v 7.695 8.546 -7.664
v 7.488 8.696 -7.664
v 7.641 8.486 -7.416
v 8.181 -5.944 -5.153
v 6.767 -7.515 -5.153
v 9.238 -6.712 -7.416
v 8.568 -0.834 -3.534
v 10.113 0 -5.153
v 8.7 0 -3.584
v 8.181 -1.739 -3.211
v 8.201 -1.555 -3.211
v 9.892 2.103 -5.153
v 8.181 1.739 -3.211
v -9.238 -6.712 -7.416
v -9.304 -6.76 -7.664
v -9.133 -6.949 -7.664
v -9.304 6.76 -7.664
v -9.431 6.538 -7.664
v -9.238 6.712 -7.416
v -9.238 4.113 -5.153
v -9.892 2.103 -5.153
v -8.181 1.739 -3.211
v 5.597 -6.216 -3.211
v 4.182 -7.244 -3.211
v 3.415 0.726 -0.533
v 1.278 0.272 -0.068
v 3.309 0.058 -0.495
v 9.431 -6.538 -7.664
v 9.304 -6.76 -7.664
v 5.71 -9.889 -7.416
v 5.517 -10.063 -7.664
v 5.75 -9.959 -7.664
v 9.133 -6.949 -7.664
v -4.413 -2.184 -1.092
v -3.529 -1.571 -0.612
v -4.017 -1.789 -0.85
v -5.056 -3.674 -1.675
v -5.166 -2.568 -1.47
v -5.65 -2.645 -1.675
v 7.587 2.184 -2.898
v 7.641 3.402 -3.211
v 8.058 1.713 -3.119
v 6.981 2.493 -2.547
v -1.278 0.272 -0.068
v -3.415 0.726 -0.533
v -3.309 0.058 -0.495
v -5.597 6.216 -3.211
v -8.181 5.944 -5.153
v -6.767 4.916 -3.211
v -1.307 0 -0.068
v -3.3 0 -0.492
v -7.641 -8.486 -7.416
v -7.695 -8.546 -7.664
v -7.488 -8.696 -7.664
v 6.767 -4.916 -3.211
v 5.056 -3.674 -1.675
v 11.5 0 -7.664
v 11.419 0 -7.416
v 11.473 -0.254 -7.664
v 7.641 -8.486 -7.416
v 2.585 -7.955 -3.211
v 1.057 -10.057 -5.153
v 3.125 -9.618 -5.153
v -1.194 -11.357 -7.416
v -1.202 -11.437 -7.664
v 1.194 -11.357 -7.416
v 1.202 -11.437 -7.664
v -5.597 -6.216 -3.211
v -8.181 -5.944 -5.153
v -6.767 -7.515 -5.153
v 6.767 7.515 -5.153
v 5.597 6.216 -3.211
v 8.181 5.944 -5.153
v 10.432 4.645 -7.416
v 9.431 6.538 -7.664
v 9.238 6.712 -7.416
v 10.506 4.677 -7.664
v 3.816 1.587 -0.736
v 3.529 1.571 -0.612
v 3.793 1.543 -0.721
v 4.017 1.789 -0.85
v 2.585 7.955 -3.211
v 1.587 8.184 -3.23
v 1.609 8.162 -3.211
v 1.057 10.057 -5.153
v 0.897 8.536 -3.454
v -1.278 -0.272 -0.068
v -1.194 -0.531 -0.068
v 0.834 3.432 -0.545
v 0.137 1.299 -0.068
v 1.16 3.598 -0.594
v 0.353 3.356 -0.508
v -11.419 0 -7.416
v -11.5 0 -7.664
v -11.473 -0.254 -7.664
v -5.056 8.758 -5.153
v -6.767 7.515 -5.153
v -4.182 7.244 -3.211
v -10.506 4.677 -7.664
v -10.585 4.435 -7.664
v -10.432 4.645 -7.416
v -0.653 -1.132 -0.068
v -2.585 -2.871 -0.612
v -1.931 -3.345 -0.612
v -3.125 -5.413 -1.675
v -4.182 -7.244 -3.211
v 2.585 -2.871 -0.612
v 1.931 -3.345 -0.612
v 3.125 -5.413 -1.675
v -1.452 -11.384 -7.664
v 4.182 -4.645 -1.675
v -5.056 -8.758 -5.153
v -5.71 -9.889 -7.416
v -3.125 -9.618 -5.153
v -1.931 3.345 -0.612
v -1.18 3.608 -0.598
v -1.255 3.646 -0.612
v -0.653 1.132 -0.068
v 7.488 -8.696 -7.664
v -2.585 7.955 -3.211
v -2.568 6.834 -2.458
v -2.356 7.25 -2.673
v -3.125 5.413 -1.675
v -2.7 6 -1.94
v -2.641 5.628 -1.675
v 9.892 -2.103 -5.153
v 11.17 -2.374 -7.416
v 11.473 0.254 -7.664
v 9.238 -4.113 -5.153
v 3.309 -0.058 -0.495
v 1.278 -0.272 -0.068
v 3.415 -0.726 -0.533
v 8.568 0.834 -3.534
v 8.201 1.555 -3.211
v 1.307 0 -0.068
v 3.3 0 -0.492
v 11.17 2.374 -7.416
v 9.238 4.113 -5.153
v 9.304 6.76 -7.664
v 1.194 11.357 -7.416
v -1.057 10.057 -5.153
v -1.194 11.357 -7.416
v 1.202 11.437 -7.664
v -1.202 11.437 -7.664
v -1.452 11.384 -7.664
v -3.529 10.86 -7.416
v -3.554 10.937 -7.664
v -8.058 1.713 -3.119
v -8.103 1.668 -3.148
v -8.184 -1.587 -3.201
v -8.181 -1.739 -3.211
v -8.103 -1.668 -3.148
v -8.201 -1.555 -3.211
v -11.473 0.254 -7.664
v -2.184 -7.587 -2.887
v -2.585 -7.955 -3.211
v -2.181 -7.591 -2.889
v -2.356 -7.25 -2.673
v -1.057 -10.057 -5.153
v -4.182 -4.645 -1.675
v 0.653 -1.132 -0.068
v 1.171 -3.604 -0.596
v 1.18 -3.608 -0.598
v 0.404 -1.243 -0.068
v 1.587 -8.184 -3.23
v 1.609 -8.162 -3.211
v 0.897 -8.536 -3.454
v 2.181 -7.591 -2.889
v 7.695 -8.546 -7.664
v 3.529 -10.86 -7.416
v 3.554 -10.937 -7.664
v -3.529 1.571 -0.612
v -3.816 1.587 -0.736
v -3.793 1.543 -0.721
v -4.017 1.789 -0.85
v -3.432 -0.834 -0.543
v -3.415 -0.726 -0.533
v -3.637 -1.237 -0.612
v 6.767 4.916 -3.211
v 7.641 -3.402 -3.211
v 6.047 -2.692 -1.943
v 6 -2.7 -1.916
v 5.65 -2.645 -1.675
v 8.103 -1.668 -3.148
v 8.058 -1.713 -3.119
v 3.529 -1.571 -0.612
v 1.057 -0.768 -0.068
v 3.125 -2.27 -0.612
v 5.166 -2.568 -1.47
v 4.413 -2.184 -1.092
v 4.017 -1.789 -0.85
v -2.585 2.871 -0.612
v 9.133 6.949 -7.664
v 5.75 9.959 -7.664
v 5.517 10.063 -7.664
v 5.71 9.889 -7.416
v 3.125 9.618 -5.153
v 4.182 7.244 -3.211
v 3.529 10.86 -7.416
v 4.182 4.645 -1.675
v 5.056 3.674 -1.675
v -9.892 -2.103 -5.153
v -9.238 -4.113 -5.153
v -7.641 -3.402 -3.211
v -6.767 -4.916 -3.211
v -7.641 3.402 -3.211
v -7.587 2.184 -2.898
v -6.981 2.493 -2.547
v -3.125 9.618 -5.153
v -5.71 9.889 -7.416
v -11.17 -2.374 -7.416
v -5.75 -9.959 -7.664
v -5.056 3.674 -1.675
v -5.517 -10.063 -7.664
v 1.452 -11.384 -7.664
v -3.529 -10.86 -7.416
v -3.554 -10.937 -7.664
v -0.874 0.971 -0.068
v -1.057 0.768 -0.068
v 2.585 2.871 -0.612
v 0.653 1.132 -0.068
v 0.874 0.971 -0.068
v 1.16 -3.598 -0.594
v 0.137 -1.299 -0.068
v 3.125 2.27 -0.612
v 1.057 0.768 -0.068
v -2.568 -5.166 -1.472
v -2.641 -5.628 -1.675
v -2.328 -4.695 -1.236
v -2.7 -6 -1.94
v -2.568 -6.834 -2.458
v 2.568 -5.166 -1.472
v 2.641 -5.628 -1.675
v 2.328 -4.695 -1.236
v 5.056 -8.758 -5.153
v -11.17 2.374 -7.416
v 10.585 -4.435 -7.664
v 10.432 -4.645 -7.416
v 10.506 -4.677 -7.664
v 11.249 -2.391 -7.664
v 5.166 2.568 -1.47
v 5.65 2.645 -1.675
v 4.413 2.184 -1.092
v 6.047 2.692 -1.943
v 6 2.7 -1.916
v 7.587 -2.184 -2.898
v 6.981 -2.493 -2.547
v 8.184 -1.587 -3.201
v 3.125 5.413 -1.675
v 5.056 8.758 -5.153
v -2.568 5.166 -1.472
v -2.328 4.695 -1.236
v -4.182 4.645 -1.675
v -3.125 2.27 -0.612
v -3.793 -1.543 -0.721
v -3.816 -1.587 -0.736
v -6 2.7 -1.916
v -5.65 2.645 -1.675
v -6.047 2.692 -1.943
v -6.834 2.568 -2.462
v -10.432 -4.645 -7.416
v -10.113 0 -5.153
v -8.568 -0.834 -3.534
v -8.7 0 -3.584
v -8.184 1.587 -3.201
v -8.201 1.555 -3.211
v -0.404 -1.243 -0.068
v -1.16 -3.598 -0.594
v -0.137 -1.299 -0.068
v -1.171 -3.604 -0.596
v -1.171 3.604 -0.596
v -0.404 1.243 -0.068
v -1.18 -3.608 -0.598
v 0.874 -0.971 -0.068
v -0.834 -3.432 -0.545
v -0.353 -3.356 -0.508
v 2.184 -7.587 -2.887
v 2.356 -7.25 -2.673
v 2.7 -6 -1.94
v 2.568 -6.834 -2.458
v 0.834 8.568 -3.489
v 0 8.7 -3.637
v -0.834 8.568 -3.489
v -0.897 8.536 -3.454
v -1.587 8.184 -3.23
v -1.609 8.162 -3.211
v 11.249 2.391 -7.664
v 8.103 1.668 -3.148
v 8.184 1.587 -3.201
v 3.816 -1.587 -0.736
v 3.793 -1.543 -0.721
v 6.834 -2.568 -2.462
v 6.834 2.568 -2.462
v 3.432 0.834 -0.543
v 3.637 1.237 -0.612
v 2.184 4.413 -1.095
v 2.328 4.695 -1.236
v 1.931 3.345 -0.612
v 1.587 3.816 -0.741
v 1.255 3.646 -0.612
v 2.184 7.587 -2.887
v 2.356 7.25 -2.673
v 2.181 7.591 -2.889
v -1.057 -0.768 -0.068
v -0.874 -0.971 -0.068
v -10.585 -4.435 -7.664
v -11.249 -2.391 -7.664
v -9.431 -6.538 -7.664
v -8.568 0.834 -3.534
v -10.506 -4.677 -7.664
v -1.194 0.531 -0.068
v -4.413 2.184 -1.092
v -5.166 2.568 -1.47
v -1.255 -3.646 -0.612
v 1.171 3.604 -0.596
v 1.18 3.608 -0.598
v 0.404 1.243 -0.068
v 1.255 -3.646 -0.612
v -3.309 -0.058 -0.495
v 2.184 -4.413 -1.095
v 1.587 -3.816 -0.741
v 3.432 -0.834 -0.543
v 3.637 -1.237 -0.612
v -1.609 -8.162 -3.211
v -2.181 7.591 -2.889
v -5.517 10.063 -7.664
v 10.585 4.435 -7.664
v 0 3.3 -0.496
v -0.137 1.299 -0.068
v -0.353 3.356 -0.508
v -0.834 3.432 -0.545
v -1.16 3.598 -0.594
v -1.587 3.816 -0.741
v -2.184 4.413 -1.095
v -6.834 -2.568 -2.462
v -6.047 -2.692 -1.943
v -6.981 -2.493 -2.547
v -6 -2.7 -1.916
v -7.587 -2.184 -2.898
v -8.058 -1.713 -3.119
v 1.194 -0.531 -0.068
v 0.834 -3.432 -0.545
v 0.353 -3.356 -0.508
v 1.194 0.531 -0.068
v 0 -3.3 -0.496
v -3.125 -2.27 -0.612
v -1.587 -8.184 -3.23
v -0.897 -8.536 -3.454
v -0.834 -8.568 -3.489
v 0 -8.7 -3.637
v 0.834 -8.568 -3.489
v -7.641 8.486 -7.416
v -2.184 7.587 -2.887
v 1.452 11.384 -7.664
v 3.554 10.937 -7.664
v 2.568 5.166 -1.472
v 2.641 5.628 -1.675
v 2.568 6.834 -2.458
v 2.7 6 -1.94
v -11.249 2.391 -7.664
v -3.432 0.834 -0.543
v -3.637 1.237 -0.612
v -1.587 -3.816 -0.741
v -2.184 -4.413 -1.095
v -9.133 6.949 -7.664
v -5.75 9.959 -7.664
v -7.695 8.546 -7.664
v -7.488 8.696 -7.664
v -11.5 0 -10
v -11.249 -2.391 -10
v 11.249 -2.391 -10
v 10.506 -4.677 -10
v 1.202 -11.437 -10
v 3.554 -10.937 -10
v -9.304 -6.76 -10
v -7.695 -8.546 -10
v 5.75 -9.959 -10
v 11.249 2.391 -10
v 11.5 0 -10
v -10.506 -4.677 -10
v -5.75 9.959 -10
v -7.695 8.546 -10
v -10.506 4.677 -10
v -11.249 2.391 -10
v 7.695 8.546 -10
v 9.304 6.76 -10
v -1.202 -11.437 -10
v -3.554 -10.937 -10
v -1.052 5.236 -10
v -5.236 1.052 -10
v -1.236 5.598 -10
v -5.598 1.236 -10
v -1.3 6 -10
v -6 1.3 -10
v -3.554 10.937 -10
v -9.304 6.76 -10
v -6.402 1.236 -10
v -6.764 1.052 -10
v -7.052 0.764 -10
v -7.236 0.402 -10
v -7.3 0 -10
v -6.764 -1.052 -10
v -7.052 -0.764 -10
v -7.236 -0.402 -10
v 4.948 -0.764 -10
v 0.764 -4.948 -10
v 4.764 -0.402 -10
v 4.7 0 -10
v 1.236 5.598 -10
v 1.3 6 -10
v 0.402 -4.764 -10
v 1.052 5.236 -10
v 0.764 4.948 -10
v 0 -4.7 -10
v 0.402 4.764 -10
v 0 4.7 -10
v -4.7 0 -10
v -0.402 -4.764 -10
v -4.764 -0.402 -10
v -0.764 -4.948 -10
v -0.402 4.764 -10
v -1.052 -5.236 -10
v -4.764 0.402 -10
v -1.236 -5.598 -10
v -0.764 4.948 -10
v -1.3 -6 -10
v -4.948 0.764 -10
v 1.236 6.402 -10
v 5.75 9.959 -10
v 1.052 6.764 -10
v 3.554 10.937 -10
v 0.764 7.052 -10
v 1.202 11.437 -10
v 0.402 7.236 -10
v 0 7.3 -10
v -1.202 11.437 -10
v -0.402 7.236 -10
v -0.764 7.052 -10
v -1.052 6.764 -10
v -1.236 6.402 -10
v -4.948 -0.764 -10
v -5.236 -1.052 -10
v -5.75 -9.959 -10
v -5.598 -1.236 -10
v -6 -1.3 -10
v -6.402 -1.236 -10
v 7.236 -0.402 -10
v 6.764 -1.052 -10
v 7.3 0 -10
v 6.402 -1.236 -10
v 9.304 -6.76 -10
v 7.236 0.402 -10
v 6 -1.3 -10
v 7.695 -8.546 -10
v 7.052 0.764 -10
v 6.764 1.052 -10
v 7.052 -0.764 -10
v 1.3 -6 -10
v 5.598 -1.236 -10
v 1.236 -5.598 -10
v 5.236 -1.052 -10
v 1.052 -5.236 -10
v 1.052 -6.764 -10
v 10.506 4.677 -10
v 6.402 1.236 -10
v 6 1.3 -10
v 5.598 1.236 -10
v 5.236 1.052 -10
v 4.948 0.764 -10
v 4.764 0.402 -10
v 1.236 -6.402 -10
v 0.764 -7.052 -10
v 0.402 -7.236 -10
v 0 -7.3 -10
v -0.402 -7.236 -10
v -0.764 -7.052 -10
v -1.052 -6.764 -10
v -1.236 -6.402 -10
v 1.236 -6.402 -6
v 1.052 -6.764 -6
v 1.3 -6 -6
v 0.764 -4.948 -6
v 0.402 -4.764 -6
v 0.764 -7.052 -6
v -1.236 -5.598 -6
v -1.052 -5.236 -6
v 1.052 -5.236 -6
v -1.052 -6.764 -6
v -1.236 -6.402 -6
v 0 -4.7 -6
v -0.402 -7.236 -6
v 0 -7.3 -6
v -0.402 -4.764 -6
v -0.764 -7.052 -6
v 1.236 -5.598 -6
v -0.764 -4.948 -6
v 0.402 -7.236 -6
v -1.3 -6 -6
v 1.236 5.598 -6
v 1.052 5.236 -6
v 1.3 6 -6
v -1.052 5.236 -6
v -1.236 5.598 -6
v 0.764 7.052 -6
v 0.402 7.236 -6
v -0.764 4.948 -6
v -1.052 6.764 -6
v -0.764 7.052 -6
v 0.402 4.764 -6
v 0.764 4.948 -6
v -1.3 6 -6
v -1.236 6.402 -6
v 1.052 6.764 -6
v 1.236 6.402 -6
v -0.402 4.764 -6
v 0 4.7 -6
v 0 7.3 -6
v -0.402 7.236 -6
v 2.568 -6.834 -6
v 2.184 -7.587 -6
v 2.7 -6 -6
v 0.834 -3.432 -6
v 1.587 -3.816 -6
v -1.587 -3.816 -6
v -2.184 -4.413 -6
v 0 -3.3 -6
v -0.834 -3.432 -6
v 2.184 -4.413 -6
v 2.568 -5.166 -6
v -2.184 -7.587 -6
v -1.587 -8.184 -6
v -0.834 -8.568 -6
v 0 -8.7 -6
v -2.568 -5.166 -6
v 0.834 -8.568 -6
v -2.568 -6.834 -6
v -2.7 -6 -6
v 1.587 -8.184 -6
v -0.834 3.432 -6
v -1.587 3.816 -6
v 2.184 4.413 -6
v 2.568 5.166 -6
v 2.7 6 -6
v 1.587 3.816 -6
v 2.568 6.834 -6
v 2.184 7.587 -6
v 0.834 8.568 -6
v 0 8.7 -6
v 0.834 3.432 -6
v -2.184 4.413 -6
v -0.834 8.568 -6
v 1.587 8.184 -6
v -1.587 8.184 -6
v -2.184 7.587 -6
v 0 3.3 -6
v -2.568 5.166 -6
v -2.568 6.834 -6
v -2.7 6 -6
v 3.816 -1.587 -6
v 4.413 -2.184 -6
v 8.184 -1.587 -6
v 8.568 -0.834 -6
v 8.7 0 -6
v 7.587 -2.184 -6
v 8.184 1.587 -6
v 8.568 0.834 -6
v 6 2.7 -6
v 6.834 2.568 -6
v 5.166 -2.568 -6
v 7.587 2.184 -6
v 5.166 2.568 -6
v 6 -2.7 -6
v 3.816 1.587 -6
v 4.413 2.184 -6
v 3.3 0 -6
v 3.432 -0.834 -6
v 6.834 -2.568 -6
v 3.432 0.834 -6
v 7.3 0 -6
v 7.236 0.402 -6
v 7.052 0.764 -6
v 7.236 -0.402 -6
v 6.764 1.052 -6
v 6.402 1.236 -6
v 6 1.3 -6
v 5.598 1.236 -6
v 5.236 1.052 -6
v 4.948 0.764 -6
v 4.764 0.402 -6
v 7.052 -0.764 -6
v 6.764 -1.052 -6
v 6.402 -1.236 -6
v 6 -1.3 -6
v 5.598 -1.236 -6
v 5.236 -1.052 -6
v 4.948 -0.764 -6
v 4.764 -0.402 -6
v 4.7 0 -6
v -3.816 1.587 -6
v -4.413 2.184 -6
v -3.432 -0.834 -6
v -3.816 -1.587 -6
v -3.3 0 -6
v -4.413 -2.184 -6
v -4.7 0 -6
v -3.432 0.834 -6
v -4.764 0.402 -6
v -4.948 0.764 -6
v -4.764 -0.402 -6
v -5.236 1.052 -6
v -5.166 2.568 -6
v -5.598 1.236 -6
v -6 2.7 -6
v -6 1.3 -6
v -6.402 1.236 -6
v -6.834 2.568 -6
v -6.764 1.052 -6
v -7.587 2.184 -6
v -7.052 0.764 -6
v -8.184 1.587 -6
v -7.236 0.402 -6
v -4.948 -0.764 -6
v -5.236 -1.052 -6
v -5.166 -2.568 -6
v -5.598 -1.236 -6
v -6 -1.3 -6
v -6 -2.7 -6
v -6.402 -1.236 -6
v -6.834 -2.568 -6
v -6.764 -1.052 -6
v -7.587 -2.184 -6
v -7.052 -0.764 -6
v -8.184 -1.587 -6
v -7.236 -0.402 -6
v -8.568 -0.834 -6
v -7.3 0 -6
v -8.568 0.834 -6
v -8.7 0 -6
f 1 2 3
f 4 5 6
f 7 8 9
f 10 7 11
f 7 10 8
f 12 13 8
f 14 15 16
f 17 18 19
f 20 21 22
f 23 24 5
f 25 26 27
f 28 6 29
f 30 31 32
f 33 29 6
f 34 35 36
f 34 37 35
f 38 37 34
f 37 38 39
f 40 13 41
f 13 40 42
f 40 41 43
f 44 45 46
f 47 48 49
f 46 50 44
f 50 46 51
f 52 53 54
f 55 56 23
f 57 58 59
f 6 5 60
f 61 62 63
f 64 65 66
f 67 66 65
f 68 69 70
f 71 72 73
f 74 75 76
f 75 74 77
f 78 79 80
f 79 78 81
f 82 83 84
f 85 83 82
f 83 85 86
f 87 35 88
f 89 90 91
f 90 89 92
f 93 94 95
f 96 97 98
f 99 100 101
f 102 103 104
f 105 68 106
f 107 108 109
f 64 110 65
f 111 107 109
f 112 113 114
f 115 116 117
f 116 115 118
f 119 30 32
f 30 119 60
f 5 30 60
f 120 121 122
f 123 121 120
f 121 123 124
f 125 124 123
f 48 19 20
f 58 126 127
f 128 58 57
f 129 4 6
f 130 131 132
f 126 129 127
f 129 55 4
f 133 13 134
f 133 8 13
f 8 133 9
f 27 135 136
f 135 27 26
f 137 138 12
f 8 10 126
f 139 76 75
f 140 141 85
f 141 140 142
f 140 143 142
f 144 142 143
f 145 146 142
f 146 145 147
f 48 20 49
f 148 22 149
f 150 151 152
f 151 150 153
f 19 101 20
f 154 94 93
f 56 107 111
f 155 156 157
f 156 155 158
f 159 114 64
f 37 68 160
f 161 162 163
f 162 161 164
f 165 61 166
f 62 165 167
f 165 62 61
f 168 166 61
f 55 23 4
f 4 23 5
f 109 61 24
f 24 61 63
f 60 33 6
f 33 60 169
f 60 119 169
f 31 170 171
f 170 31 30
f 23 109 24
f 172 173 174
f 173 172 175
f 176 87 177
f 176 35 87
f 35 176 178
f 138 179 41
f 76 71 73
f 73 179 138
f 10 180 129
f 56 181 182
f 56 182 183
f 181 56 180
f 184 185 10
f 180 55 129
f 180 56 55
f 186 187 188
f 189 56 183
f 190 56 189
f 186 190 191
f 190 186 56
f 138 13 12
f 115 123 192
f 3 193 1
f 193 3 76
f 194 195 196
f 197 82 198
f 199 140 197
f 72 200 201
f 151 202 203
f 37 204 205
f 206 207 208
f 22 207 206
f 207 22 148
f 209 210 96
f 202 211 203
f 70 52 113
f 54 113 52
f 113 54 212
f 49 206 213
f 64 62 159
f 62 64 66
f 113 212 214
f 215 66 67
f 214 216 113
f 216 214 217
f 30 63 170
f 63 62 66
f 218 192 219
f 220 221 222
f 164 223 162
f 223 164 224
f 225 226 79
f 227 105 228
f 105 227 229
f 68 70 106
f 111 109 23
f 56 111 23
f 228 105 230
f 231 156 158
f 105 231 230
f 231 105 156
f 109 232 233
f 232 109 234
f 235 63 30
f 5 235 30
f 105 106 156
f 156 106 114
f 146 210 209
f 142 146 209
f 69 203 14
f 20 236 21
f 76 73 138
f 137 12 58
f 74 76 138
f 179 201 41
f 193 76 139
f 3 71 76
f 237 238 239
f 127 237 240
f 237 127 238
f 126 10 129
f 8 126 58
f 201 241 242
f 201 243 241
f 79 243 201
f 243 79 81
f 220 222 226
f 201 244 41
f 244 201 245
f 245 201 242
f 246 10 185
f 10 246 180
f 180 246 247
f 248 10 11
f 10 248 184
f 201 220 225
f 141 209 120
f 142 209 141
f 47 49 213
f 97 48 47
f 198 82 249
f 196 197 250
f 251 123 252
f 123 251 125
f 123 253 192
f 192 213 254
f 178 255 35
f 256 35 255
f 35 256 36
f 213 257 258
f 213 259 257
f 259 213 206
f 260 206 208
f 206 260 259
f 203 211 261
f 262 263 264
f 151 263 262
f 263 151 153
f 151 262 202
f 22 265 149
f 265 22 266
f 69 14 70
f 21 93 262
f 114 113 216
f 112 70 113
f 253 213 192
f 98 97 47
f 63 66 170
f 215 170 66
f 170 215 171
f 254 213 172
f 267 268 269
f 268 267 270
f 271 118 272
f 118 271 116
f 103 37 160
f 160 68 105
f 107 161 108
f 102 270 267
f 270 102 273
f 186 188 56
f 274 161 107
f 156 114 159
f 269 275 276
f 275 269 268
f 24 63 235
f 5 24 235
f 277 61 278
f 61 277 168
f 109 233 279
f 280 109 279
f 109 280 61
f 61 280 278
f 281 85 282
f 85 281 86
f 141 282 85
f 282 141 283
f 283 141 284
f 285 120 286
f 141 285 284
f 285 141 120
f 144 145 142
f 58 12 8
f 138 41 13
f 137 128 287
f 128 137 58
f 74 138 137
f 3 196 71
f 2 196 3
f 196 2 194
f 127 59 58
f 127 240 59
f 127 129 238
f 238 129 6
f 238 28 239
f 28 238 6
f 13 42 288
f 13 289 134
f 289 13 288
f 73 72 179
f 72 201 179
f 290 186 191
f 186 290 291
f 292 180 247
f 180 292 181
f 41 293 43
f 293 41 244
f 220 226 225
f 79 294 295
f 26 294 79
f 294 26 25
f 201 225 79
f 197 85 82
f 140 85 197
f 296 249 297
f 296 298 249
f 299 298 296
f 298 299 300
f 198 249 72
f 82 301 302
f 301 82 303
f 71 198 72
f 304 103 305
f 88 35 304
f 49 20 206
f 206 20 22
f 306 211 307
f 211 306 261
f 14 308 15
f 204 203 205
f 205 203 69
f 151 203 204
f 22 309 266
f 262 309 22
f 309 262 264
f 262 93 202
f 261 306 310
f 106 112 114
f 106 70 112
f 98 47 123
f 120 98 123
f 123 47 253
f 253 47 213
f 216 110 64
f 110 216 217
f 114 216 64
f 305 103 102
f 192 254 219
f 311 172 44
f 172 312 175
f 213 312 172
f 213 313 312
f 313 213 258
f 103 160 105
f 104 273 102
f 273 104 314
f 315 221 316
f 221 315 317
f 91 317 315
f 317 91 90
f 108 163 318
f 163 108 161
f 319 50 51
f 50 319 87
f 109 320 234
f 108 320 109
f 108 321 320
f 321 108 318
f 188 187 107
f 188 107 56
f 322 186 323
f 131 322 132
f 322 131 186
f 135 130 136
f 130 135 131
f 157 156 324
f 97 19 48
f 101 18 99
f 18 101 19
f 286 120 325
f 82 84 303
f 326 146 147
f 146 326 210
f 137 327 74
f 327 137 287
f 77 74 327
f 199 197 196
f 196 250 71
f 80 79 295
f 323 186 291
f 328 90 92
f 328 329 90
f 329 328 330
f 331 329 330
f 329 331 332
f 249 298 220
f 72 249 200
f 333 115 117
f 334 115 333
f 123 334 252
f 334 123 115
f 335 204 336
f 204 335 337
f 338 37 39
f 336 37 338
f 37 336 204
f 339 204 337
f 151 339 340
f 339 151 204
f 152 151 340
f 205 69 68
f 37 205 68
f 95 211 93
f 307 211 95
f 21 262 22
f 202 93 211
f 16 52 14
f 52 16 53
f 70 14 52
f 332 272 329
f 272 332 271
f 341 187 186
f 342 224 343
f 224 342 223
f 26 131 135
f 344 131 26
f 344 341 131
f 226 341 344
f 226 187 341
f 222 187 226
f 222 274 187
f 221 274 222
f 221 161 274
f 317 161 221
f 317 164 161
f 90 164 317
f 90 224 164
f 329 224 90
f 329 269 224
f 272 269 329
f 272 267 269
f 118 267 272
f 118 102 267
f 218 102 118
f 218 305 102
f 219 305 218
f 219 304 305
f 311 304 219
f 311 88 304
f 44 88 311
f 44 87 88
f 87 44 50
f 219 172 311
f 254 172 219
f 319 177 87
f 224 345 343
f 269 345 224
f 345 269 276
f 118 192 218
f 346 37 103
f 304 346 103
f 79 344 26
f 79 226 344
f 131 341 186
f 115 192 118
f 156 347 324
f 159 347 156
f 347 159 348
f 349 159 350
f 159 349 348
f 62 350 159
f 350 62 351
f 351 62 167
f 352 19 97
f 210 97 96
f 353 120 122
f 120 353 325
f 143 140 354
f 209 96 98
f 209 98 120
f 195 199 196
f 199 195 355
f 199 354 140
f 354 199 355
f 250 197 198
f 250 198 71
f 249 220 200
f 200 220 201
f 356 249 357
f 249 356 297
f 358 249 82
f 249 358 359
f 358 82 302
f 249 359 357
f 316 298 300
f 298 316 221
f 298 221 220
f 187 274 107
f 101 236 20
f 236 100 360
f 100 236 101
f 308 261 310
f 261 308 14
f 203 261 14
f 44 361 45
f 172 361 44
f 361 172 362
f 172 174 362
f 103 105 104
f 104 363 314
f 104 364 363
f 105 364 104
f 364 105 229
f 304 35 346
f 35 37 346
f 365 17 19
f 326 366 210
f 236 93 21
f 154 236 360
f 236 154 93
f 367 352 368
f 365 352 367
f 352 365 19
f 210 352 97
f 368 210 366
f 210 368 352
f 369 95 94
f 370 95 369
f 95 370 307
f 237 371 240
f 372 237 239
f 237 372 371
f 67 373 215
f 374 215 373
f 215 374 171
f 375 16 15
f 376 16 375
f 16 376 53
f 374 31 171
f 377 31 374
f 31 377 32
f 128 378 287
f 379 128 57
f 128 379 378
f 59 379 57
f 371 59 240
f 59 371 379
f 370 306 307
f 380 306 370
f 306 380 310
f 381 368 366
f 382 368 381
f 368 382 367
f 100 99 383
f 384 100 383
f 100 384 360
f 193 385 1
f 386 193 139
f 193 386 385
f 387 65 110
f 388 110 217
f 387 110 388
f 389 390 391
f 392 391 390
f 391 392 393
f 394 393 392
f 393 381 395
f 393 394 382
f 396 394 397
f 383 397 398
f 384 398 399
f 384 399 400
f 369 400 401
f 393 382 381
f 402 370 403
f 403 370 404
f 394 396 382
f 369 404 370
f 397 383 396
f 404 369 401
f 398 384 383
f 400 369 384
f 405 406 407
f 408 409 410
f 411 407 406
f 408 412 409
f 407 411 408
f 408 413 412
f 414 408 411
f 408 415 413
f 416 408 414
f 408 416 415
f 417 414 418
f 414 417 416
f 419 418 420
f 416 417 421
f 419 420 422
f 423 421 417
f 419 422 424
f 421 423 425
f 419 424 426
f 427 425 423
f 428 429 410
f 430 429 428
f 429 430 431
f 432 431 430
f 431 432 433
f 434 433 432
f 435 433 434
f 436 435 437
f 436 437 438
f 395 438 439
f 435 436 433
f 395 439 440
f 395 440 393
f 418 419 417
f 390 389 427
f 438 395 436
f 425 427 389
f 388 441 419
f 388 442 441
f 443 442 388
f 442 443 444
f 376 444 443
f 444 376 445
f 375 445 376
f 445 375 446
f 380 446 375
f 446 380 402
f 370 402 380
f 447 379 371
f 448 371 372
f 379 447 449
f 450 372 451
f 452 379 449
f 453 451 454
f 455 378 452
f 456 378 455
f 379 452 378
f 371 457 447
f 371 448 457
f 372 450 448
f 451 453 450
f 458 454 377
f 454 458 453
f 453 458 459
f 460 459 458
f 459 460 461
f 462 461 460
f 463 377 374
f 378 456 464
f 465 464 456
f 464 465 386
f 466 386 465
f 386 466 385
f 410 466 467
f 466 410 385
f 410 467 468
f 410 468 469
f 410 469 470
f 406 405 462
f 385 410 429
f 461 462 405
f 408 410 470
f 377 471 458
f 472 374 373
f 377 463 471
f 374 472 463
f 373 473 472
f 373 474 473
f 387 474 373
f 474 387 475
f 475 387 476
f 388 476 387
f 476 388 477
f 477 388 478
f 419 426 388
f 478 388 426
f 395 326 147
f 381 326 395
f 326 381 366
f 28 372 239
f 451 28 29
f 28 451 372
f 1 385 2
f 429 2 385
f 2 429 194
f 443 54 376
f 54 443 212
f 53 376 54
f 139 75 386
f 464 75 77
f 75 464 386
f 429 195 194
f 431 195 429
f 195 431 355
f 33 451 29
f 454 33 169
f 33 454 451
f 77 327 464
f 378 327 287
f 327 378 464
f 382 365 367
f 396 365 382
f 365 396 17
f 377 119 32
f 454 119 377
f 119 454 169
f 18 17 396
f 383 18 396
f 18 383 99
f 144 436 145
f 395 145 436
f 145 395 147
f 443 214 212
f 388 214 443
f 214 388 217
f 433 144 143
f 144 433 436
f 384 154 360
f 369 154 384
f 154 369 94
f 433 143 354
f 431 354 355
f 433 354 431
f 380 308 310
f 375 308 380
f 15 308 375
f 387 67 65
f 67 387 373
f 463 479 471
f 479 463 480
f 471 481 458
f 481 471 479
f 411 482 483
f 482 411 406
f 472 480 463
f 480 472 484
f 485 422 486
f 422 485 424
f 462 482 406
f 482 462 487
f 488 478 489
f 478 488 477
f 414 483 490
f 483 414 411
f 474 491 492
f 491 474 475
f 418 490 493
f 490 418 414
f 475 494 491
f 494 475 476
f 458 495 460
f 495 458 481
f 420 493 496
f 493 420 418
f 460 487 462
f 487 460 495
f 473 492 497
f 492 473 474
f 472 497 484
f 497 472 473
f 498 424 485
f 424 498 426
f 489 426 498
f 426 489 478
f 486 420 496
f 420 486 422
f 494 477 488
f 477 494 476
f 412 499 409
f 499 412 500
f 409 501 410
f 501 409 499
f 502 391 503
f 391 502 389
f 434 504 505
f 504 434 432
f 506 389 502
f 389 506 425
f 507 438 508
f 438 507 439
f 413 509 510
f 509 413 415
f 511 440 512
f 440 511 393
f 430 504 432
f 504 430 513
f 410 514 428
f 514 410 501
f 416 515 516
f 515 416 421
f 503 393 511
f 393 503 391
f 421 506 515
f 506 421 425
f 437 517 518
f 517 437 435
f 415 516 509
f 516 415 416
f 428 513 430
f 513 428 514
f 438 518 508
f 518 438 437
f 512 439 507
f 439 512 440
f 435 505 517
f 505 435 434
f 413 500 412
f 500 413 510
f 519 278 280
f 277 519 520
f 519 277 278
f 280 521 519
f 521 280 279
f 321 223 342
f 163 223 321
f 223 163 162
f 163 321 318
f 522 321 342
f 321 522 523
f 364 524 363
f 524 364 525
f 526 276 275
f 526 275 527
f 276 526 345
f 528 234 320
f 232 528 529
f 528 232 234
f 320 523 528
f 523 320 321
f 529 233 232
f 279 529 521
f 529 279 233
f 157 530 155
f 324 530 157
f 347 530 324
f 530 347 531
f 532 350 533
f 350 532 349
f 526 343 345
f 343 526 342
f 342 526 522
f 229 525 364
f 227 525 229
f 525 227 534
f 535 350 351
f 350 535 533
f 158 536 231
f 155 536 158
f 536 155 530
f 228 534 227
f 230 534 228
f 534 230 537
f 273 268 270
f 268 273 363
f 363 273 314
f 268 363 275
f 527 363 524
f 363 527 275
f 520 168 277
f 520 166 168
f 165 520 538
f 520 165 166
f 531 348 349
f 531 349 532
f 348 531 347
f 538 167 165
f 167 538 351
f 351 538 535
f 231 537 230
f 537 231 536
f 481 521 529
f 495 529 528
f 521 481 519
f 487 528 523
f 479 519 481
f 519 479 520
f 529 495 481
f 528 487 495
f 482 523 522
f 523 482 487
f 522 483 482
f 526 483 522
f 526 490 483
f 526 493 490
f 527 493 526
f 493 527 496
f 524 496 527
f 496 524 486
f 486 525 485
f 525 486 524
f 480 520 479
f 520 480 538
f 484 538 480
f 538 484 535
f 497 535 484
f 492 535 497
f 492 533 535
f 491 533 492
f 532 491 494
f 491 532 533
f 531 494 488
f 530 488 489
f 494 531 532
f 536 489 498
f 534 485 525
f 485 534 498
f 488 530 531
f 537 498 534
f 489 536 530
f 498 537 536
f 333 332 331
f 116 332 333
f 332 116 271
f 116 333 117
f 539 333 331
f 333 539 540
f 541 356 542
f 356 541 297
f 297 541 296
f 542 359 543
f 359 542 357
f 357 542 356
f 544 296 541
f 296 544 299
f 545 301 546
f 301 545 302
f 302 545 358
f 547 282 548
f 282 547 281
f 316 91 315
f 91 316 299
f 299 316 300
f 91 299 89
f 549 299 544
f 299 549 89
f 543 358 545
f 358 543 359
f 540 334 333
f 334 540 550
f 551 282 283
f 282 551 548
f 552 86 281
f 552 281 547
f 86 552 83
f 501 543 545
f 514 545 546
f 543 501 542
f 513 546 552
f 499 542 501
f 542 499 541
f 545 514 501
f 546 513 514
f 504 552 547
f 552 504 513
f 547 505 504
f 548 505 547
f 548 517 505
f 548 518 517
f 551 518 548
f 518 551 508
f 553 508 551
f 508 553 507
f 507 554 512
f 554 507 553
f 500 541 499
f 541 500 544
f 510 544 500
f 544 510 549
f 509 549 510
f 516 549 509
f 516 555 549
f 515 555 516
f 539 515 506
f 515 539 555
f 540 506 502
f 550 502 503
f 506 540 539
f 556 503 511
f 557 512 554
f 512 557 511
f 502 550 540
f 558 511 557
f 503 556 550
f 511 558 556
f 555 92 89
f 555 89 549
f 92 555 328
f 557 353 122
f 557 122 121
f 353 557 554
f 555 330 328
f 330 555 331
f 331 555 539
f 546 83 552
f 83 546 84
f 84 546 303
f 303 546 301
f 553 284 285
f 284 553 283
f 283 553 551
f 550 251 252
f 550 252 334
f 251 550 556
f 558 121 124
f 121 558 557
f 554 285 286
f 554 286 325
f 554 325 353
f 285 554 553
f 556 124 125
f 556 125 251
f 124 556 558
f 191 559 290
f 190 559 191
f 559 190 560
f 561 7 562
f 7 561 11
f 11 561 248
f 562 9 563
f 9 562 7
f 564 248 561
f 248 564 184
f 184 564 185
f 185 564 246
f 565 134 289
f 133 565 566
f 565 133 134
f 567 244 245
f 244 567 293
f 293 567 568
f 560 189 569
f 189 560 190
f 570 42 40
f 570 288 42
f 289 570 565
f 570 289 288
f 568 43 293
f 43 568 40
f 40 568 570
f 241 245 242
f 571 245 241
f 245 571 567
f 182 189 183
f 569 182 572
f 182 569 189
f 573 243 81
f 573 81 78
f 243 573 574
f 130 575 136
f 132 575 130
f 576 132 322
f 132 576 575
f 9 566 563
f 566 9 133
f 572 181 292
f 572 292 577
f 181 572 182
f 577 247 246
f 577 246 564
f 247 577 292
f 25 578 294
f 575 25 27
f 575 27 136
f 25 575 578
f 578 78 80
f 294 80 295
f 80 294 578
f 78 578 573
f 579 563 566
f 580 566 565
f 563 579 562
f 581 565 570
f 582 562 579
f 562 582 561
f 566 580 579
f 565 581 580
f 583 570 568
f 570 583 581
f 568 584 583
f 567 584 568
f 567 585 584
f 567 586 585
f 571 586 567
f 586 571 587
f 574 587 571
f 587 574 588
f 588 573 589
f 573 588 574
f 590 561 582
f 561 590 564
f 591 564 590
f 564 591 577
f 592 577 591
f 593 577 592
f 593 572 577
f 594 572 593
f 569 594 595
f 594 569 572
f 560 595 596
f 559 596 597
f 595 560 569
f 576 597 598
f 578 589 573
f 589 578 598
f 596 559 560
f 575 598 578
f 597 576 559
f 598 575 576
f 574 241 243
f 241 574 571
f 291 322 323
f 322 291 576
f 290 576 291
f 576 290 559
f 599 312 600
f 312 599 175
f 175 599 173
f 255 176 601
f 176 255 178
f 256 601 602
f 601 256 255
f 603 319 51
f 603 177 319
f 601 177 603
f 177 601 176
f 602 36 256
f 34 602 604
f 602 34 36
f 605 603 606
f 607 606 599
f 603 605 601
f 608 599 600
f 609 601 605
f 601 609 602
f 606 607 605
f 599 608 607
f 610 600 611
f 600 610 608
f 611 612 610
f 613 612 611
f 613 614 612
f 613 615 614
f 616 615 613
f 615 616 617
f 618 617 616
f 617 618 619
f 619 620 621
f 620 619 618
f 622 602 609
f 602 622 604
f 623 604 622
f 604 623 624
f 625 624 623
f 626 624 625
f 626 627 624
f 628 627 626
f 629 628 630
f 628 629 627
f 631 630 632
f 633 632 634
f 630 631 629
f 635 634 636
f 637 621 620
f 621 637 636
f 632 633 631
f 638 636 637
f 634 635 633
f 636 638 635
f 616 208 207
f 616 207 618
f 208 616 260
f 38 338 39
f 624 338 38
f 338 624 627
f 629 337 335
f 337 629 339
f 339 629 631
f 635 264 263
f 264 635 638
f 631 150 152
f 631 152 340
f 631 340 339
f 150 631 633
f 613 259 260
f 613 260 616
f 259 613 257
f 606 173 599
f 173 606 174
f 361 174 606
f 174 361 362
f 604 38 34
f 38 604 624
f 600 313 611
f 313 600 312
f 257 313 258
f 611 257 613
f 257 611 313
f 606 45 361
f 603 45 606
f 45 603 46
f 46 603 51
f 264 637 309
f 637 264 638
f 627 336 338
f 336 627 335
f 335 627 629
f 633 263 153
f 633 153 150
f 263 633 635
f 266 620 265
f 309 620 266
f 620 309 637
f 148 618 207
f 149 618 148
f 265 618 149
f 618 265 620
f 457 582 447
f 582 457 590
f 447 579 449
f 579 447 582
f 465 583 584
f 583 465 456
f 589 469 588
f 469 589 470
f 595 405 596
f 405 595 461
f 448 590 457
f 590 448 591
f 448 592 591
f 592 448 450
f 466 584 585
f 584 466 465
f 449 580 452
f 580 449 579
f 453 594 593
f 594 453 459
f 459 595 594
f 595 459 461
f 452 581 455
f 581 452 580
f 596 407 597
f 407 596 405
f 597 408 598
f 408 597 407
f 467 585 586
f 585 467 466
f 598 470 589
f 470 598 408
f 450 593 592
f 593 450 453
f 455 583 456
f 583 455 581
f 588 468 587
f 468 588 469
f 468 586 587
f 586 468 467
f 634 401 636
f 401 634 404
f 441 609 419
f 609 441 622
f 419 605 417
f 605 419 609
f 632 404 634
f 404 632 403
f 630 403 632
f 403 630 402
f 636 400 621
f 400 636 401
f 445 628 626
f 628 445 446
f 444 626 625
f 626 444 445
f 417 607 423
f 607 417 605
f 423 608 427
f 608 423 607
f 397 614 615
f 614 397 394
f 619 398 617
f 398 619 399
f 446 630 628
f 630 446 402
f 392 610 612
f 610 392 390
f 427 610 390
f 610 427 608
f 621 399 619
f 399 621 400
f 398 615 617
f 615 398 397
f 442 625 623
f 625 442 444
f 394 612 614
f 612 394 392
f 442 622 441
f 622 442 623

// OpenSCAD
// Diameter of skid (same as motor works well)
diameter        = 23;

// Height of skid, wanna stand tall?
height          = 10;

// Diameter of the sphere used for curved bottom of skid
curvature       = 25;

// First motor mounting hole spacing (used for two-hole and four-hole mounting)
spacing1        = 12;

// Second motor mounting hole spacing (used for four-hole mounting)
spacing2        = 12;

// Motor mounting screw size, adjusted for clearance
holesize        = 2; // [2:M2, 3:M3]

// Thickness of base (increases motor screw lengths)
thickness       = 4; // [1:1MM, 2:2MM, 3:3MM, 4:4MM, 5:5MM, 6:6MM]

// Rounded is heavier and stonger and cross is lighter
style           = 1; // [1:Rounded, 2:Cross]

// Number of mounting holes
count           = 4; // [2:Two, 4:Four]

holesize_r      = holesize/2;
curvature_r     = curvature/2;
diameter_r      = diameter/2;

// Rotate it for correct printing orientation.
rotate([180, 0, 0]) {
    difference() {
        // Skid body
        intersection() {
            translate([0, 0, curvature_r]) sphere(r=curvature_r);
            cylinder(r=diameter_r, h=height);
        }

        // Mounting holes
        // Screw shafts
        translate([spacing1/2, 0, 0]) cylinder(r=holesize_r*1.3, h=height, $fn=20);
        translate([0-spacing1/2, 0, 0]) cylinder(r=holesize_r*1.3, h=height, $fn=20);
        if (count==4) {
            translate([0, spacing2/2, 0]) cylinder(r=holesize_r*1.3, h=height, $fn=20);
            translate([0, 0-spacing2/2, 0]) cylinder(r=holesize_r*1.3, h=height, $fn=20);
        }

        if (style==1) {
            // Style: Rounded
            // Screw head insets
            translate([spacing1/2, 0, 0]) cylinder(r=holesize_r+1.7, h=height-thickness, $fn=20);
            translate([0-spacing1/2, 0, 0]) cylinder(r=holesize_r+1.7, h=height-thickness, $fn=20);
            if (count==4) {
                translate([0, spacing2/2, 0]) cylinder(r=holesize_r+1.7, h=height-thickness, $fn=20);
                translate([0, 0-spacing2/2, 0]) cylinder(r=holesize_r+1.7, h=height-thickness, $fn=20);
            }
        } else {
            // Style: Cross
            // Square cutouts
            rotate([0, 0, 45]) translate([1.5, 1.5, 0-thickness]) cube([diameter_r, diameter_r, height]);
            rotate([0, 0, -45]) translate([1.5, 1.5, 0-thickness]) cube([diameter_r, diameter_r, height]);
            rotate([0, 0, 135]) translate([1.5, 1.5, 0-thickness]) cube([diameter_r, diameter_r, height]);
            rotate([0, 0, 225]) translate([1.5, 1.5, 0-thickness]) cube([diameter_r, diameter_r, height]);
        }
    }
}
